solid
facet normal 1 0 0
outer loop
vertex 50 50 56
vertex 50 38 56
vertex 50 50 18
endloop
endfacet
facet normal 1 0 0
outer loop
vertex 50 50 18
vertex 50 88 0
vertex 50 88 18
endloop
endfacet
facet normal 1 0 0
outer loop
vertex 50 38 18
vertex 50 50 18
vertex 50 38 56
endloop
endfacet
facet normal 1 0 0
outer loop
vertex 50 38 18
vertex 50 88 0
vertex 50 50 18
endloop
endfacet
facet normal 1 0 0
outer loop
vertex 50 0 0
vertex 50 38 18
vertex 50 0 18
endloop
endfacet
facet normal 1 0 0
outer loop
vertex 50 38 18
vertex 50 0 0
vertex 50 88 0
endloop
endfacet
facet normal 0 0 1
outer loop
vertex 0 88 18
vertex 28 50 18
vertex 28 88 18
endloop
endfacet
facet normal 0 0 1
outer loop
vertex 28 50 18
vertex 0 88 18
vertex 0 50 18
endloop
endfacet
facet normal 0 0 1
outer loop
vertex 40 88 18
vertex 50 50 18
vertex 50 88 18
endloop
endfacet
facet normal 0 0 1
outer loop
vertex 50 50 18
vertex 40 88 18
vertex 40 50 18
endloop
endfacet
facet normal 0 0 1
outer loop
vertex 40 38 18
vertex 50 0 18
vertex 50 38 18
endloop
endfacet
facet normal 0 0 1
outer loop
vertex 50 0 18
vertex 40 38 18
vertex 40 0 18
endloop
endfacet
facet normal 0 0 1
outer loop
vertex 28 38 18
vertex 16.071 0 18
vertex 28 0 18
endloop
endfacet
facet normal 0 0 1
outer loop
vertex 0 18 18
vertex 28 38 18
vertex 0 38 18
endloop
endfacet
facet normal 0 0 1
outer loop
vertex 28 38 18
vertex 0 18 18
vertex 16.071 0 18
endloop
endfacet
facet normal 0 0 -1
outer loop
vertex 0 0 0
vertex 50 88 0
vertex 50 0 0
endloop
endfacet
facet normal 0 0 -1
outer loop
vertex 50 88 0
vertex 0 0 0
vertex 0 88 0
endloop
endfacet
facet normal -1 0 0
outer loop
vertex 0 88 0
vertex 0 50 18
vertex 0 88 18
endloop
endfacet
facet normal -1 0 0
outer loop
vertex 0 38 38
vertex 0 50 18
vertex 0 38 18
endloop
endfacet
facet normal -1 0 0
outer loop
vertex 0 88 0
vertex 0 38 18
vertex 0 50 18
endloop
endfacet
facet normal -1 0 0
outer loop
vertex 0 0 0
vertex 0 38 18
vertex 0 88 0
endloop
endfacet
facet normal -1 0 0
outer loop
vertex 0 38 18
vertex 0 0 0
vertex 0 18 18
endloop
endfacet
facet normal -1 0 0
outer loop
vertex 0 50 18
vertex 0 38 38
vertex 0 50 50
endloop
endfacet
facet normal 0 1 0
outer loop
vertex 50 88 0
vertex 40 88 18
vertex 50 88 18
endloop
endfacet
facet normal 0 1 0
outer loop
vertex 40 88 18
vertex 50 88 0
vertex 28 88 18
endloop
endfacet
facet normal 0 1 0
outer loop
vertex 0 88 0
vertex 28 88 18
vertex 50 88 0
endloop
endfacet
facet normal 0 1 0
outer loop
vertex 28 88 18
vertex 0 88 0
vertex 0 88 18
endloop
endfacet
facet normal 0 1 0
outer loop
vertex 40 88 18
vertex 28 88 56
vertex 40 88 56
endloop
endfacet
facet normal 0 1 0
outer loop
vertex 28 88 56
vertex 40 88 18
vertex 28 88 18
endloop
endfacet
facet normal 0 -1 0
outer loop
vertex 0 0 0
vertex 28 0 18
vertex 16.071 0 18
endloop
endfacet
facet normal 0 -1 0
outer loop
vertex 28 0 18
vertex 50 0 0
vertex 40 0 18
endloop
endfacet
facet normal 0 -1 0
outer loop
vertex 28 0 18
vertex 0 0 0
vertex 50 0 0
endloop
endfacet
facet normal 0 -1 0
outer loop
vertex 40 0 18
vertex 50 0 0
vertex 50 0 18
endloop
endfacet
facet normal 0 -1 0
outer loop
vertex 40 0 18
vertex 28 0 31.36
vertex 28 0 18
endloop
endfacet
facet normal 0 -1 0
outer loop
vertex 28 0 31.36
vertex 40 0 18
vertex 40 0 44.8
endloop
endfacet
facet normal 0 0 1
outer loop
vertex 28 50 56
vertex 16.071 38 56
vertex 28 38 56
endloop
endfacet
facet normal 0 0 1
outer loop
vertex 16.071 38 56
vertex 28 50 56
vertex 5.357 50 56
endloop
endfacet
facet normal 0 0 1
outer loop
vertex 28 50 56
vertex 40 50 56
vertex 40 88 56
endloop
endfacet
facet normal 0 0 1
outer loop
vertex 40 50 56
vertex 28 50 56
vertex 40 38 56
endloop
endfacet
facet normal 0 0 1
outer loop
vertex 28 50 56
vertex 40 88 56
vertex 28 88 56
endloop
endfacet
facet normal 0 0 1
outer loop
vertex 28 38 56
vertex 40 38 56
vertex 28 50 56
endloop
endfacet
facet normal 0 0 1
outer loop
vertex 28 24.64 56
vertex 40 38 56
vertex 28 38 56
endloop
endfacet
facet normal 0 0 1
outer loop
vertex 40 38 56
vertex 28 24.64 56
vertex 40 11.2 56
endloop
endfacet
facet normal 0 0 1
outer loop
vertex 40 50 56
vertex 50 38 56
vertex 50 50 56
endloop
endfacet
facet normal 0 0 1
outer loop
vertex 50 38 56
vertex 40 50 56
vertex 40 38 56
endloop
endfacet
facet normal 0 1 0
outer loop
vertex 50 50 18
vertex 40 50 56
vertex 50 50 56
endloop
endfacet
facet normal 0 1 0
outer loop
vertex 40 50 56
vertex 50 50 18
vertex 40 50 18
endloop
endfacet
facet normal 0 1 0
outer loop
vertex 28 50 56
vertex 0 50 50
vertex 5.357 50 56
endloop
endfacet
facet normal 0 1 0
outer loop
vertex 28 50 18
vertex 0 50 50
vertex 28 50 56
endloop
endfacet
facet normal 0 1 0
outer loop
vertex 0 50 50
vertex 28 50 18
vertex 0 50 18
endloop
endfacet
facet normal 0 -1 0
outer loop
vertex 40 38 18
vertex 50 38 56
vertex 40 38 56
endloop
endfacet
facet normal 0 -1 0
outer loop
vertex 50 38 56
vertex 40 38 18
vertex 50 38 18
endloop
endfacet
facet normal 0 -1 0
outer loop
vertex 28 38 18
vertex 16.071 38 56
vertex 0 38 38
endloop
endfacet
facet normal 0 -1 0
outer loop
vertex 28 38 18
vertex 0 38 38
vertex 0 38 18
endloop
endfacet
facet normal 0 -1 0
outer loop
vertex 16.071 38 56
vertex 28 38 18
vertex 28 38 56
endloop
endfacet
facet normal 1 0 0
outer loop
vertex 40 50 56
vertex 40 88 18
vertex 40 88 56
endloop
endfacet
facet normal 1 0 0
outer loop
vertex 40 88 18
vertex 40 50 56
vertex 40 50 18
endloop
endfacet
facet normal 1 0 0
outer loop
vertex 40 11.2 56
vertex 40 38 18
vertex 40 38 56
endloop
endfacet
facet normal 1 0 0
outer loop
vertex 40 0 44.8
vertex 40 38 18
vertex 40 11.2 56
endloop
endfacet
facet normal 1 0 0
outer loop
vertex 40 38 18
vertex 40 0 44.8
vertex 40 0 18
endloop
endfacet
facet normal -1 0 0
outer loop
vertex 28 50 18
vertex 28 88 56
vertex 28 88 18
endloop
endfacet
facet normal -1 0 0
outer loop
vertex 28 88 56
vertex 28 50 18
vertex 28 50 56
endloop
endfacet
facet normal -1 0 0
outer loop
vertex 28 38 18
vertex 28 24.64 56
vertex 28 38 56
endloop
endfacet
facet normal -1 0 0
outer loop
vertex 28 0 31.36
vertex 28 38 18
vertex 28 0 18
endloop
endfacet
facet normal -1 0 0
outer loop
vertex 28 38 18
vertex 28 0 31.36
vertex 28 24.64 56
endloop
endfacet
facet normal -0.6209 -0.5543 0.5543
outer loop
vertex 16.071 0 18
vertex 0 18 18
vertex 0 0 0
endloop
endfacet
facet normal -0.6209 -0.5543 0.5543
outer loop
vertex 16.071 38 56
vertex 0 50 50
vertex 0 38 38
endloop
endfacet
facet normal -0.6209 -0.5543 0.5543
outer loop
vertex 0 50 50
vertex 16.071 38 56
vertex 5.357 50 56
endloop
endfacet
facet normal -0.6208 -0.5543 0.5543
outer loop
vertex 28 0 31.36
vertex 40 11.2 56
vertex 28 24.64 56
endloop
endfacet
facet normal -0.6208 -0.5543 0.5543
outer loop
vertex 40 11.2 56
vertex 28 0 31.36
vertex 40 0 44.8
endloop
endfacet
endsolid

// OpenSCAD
difference() {
    union() {
        cube([50, 88, 18]);

        translate([0,88-38-12,0])
        cube([50,12,56]);

        translate([28,0,0])
        cube([12,88,56]);

        //cube([50,88,56]); // full cube
    }
    hull() 
    {
        rotate([45,0,0])
        translate([-1,0,0])
        cube([1,100,100]);
        rotate([0,-atan(56/50),0])
        translate([0,-1,0])
        cube([100,1,100]);
    }
}
